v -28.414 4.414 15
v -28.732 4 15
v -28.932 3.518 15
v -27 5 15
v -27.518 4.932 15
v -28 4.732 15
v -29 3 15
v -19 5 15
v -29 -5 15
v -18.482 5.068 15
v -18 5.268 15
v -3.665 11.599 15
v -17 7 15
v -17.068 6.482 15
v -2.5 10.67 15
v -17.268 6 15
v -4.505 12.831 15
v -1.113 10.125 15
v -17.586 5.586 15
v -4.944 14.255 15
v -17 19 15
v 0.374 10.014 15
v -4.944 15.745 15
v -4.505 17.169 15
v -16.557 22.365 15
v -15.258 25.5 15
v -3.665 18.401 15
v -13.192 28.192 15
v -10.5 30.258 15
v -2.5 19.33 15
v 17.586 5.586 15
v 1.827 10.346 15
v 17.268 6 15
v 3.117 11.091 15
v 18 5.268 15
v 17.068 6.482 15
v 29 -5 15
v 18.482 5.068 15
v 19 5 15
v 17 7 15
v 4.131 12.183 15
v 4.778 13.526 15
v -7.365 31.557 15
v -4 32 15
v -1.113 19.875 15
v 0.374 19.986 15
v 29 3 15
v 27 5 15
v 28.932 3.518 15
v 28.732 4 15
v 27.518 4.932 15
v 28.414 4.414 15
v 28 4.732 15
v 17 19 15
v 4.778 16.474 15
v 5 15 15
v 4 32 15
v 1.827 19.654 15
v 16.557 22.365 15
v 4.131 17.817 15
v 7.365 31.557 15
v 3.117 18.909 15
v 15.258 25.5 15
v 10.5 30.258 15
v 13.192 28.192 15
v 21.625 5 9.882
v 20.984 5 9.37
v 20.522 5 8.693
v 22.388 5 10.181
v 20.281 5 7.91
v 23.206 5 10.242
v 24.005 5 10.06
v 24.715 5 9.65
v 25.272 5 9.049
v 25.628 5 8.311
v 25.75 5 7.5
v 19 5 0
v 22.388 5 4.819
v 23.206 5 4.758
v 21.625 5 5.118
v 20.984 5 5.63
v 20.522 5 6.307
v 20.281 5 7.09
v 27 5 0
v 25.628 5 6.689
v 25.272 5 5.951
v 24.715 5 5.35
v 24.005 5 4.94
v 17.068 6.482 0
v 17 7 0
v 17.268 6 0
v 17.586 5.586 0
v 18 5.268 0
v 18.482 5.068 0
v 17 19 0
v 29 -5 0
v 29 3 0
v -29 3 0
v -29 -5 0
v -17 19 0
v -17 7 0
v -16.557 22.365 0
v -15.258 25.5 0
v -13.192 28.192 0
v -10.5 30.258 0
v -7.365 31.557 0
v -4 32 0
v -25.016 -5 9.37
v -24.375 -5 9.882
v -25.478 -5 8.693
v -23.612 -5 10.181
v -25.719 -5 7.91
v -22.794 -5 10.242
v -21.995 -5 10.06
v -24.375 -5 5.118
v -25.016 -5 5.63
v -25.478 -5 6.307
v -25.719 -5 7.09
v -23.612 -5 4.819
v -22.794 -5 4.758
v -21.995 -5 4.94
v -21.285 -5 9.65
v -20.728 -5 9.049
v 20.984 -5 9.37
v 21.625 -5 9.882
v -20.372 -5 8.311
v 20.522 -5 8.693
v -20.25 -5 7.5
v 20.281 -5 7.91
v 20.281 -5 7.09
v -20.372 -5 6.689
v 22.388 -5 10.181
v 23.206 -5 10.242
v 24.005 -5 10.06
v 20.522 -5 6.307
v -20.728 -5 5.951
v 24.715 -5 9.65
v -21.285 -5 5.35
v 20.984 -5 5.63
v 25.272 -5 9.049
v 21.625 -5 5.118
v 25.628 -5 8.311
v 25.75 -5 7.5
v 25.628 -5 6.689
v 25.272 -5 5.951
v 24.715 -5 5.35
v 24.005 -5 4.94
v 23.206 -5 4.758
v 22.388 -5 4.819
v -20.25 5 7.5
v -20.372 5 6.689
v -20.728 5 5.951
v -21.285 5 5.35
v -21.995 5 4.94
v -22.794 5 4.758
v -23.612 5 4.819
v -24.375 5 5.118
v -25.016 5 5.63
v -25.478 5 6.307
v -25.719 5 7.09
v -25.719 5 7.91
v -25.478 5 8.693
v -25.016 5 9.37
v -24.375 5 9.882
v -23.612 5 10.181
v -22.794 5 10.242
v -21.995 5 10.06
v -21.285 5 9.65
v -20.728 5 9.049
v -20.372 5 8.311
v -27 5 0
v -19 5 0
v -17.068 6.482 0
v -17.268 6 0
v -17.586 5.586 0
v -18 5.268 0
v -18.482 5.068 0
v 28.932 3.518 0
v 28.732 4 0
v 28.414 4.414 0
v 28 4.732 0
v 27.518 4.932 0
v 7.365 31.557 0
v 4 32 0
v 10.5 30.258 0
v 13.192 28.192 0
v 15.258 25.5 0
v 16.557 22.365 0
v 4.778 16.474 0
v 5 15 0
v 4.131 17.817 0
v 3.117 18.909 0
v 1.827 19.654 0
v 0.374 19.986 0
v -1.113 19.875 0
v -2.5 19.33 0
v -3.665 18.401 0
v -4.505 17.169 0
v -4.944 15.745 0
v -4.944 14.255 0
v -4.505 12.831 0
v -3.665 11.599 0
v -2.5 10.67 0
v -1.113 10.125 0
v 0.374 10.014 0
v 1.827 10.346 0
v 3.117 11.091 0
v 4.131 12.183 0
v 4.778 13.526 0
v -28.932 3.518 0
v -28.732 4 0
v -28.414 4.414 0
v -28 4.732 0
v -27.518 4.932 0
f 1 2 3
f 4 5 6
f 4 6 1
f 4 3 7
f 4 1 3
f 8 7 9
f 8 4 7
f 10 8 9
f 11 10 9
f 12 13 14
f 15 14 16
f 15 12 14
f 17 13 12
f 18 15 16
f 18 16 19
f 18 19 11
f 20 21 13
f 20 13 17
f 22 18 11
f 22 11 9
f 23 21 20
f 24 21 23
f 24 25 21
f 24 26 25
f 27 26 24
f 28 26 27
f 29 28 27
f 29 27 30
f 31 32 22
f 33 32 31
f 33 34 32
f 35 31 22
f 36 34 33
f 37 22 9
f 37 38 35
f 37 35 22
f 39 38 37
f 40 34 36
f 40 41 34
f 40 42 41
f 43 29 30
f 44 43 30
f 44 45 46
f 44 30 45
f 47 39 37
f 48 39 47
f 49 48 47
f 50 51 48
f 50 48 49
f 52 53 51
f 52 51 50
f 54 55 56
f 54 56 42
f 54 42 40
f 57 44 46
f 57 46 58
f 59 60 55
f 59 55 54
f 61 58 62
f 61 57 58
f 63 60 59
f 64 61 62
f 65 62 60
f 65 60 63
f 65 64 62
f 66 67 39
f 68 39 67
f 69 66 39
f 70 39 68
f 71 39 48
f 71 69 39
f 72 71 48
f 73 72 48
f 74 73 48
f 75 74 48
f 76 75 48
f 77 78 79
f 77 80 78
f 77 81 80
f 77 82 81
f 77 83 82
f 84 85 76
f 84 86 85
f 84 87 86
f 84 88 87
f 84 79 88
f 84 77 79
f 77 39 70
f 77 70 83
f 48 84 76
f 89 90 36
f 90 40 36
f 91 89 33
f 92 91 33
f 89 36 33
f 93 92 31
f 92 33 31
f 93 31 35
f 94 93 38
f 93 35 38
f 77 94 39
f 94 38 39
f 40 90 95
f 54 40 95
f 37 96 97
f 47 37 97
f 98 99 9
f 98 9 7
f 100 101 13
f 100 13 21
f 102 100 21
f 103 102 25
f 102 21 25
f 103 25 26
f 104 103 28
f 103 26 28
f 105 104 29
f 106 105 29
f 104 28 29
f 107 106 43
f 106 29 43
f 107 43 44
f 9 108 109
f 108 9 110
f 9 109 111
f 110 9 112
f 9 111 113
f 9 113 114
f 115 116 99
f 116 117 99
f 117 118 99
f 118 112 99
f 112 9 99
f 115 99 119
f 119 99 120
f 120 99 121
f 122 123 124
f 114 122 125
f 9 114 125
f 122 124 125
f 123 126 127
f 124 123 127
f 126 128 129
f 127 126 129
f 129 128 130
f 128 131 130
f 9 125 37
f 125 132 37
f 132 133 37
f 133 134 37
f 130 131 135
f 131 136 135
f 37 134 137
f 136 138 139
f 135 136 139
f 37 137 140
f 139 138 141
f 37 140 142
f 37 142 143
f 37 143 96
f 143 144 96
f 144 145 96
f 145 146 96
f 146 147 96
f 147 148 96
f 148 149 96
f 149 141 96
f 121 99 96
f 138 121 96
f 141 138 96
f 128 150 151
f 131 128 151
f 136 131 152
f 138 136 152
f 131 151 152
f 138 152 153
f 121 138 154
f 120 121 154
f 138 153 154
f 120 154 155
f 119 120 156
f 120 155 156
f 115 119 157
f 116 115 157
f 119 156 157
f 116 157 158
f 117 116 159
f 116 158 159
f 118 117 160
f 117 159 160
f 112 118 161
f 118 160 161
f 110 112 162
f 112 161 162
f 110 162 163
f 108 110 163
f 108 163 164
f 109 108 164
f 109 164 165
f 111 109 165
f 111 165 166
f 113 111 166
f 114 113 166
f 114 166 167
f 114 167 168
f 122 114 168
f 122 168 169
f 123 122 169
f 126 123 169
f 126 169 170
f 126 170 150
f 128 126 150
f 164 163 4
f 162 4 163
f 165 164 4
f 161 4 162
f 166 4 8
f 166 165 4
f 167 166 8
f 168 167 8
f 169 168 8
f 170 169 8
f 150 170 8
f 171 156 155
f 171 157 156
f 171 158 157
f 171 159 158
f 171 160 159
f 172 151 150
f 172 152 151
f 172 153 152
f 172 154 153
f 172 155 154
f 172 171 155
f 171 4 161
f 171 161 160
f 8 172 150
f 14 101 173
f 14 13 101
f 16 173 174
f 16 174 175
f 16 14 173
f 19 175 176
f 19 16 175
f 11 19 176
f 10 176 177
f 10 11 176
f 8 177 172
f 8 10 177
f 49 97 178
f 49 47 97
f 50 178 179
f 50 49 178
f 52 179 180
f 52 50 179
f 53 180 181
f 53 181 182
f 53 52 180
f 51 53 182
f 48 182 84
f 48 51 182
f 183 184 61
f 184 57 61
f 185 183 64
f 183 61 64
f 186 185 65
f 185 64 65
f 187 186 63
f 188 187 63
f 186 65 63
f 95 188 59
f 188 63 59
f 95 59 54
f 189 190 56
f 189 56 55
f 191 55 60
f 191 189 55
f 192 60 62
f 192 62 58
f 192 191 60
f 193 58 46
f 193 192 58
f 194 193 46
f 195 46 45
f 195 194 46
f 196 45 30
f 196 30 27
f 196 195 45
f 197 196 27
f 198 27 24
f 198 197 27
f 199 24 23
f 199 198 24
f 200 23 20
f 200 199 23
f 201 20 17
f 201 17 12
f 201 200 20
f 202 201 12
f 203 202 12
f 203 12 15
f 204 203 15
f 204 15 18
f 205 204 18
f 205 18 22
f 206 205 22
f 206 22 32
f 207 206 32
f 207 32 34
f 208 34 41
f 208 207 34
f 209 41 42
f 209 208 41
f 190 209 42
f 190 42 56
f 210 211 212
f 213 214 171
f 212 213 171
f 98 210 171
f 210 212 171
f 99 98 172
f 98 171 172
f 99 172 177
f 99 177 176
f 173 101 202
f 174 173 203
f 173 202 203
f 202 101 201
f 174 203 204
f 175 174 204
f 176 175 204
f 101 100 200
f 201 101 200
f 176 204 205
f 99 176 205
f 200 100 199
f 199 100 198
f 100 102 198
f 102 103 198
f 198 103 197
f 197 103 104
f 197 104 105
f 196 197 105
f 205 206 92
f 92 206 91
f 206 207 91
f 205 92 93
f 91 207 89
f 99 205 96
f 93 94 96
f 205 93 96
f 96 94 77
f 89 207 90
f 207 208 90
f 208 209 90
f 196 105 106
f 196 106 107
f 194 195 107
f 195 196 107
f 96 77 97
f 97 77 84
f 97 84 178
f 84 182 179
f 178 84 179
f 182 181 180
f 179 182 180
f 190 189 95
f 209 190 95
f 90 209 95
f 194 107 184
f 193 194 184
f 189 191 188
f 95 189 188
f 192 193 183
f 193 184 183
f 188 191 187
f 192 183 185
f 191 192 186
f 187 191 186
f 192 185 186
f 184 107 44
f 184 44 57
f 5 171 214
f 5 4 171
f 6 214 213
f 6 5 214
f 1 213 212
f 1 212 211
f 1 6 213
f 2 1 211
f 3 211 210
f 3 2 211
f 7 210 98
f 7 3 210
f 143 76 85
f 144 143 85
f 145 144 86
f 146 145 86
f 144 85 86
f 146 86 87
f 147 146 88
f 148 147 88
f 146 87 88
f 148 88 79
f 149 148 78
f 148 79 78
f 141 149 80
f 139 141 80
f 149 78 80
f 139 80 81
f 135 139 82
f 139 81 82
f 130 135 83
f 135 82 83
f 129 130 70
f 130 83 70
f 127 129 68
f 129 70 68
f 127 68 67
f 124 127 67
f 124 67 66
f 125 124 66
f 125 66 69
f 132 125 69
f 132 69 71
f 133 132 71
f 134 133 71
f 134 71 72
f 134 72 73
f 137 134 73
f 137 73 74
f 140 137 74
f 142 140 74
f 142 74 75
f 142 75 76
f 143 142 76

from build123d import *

# Parameters (mm, degrees)
SKETCH_1_W          = 58
SKETCH_1_H          = 10
SKETCH_1_W_2        = 34
SKETCH_1_H_2        = 27
SKETCH_1_R          = 5
EXTRUDE_1_DEPTH     = 15
SKETCH_2_R          = 2.75
CUT_EXTRUDE_1_DEPTH = 15
FILLET_2_R          = 13
FILLET_3_R          = 2


with BuildPart() as part:
    # 草图1 → 凸台-拉伸1 (new body)
    with BuildSketch(Plane.XY):
        Rectangle(SKETCH_1_W, SKETCH_1_H)
        with Locations((0, 18.5)):
            Rectangle(SKETCH_1_W_2, SKETCH_1_H_2)
        with Locations((0, 15)):
            Circle(SKETCH_1_R, mode=Mode.SUBTRACT)
    extrude(amount=EXTRUDE_1_DEPTH)

    # 草图2 → 切除-拉伸1 (cut)
    with BuildSketch(Plane(origin=(0, 5, 0), x_dir=(1, 0, 0), z_dir=(0, 1, 0))):
        with Locations((-23, -7.5)):
            Circle(SKETCH_2_R)
        with Locations((23, -7.5)):
            Circle(SKETCH_2_R)
    extrude(amount=-CUT_EXTRUDE_1_DEPTH, mode=Mode.SUBTRACT)

    # 圆角2
    fillet_2_edges = [part.edges().sort_by_distance(p)[0] for p in [
        (-17, 32, 7.5),
        (17, 32, 7.5),
    ]]
    fillet(fillet_2_edges, radius=FILLET_2_R)

    # 圆角3
    fillet_3_edges = [part.edges().sort_by_distance(p)[0] for p in [
        (-29, 5, 7.5),
        (-17, 5, 7.5),
        (17, 5, 7.5),
        (29, 5, 7.5),
    ]]
    fillet(fillet_3_edges, radius=FILLET_3_R)


solid = part.part
